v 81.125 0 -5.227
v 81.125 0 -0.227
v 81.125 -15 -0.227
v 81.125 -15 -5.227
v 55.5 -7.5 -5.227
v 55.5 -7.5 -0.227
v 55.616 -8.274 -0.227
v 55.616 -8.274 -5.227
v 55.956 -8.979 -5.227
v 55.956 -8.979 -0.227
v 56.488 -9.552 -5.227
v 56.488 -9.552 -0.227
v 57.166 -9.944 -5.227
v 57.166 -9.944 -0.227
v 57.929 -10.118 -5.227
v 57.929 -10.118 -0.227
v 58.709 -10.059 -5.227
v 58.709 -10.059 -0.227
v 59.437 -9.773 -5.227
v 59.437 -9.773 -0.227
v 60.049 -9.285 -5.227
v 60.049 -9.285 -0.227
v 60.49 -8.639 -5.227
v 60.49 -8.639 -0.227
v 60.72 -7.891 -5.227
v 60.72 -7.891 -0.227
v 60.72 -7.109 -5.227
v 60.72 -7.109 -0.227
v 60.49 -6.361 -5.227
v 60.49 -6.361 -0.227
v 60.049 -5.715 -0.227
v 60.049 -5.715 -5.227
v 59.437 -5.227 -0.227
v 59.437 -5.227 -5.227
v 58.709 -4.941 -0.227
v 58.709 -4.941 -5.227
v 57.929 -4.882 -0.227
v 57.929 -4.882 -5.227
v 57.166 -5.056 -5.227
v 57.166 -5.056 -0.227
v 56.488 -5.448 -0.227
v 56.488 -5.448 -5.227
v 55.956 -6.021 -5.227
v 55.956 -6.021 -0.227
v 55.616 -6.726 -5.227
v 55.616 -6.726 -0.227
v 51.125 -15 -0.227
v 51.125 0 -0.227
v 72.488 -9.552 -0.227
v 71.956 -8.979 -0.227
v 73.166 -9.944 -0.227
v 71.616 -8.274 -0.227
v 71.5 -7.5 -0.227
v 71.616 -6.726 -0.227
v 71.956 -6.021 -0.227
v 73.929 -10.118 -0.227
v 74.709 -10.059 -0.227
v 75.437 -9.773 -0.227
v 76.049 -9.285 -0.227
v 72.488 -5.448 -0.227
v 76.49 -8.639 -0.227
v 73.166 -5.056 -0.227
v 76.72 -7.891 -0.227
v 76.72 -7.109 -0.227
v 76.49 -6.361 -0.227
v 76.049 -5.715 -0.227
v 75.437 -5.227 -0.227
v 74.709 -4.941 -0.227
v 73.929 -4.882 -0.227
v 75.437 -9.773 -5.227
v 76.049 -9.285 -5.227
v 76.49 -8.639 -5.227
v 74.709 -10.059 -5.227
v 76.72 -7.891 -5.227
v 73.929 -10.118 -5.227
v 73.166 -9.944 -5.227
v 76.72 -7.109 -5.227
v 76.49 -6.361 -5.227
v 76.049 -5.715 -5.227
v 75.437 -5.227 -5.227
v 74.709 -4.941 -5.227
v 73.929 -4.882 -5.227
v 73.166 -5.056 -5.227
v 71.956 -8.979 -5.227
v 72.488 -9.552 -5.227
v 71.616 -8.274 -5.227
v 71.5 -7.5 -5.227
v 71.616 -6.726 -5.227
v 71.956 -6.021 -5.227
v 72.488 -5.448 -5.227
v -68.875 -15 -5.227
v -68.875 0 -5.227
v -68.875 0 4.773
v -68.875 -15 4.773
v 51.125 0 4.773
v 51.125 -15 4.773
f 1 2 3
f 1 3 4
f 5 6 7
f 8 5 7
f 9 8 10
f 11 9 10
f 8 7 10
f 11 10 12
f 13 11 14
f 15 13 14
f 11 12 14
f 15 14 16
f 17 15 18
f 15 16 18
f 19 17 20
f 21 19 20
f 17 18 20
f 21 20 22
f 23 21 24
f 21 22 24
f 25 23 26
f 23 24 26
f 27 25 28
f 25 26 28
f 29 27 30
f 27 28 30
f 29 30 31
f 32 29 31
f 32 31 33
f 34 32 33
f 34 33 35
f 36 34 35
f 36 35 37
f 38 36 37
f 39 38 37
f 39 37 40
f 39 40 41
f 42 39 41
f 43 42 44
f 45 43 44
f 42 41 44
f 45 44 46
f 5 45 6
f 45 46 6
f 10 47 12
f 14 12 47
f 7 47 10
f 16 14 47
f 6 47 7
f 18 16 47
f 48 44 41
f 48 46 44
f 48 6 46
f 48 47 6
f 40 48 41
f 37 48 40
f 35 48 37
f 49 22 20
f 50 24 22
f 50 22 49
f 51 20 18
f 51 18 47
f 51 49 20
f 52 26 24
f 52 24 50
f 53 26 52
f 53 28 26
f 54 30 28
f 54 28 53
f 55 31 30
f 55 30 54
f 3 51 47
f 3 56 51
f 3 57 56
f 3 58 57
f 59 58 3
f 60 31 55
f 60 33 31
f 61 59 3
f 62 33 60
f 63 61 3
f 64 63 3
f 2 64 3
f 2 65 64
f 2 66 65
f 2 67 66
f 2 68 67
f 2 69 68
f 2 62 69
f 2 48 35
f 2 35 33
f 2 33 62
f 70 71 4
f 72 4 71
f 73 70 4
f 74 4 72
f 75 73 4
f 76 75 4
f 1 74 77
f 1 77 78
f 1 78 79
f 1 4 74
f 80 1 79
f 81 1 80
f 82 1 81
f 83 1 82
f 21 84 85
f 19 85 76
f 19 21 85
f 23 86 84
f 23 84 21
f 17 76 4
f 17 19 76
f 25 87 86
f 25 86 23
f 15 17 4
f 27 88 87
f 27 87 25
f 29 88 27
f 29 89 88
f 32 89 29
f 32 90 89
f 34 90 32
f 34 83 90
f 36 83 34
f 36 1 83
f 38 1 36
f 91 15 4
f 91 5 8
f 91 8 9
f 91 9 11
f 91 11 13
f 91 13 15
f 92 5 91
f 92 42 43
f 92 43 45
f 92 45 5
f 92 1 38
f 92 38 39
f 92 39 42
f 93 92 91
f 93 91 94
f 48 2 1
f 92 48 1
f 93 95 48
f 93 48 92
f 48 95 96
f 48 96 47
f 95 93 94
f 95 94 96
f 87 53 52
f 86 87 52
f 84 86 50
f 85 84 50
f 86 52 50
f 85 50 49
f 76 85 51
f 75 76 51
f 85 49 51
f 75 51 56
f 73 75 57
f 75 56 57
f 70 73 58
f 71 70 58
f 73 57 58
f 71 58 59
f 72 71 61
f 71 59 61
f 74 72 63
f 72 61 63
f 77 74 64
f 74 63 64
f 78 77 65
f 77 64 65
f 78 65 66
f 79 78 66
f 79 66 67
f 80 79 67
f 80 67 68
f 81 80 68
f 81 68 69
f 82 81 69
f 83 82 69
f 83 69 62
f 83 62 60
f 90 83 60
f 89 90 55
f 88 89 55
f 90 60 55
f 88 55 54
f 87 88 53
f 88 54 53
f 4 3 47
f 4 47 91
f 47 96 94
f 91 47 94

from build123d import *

# Parameters (mm, degrees)
PAD_DEPTH    = 15
SKETCH001_R  = 2.625
POCKET_DEPTH = 5


with BuildPart() as part:
    # Sketch → Pad (new body)
    with BuildSketch(Plane.XZ):
        Polygon((-68.87526, -5.227487), (-68.87526, 4.772513), (51.12474, 4.772513), (51.12474, -0.227487), (81.12474, -0.227487), (81.12474, -5.227487), align=None)
    extrude(amount=PAD_DEPTH)

    # Sketch001 (on Face4 of Pad) → Pocket (cut)
    with BuildSketch(Plane(origin=(0, 0, -0.227487), x_dir=(-1, 0, 0), z_dir=(0, 0, 1))):
        with Locations((-74.12474, 7.5)):
            Circle(SKETCH001_R)
        with Locations((-58.12474, 7.5)):
            Circle(SKETCH001_R)
    extrude(amount=-POCKET_DEPTH, mode=Mode.SUBTRACT)


solid = part.part
